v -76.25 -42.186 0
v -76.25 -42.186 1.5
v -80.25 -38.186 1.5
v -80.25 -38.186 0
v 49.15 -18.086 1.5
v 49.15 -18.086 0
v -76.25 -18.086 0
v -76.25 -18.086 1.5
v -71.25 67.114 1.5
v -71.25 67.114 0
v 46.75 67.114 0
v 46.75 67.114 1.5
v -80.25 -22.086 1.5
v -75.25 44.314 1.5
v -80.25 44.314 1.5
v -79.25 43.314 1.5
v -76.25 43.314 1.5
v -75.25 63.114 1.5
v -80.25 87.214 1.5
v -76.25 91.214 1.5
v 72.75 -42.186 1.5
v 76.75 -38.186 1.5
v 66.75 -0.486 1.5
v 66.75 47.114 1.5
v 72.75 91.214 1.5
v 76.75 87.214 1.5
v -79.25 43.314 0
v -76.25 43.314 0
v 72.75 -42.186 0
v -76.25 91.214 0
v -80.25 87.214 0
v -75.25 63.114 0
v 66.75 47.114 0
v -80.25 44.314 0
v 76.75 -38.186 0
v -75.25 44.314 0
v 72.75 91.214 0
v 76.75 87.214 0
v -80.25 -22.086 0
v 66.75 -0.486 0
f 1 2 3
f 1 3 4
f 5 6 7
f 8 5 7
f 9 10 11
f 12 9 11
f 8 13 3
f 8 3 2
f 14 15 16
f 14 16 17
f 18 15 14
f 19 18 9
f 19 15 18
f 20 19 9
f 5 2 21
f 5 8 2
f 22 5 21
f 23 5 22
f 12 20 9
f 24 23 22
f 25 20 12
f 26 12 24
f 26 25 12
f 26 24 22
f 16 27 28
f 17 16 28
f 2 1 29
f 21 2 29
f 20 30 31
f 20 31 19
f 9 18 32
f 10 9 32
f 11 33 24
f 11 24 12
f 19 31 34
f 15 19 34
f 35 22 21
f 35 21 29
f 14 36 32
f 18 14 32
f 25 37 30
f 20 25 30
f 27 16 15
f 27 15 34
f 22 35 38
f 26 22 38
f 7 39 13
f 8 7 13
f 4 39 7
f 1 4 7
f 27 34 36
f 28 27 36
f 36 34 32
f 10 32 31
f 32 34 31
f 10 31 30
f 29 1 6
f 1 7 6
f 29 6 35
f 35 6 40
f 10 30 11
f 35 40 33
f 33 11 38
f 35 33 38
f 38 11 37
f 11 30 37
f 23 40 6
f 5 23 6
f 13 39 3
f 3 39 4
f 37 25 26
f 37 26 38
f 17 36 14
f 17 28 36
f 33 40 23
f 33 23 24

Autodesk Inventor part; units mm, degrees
ref_plane "YZ Plane" through (0, 0, 0) normal (1, 0, 0) x (0, 1, 0)
ref_plane "XZ Plane" through (0, 0, 0) normal (0, 1, 0) x (-1, 0, 0)
ref_plane "XY Plane" through (0, 0, 0) normal (0, 0, 1) x (1, 0, 0)
sketch "Эскиз1" plane through (0, 0, 0) normal (0, 0, 1) x (1, 0, 0)
  line L0 (0, 0) -> (-80.25, 0) construction
  line L1 (-80.25, 0) -> (-80.25, -18.086) construction
  line L2 (-80.25, -18.086) -> (0, -18.086) construction
  line L3 (0, -18.086) -> (0, 0) construction
  line L4 (-80.25, -18.086) -> (-80.25, -42.186) construction
  line L5 (-80.25, -18.086) -> (-56.15, -18.086) construction
  line L6 (-80.25, -42.186) -> (76.75, -42.186)
  line L7 (76.75, -42.186) -> (76.75, 91.214)
  line L8 (76.75, 91.214) -> (-80.25, 91.214)
  line L9 (-80.25, 91.214) -> (-80.25, -42.186)
  line L10 (-80.25, -42.186) -> (76.75, -42.186)
  line L11 (76.75, -42.186) -> (76.75, -18.086)
  line L12 (76.75, -18.086) -> (-80.25, -18.086)
  line L13 (-80.25, -18.086) -> (-80.25, -42.186)
  line L14 (76.75, 91.214) -> (-80.25, 91.214)
  line L15 (-80.25, 91.214) -> (-80.25, 67.114)
  line L16 (-80.25, 67.114) -> (76.75, 67.114)
  line L17 (76.75, 67.114) -> (76.75, 91.214)
  line L18 (-80.25, -42.186) -> (-75.25, -42.186)
  line L19 (-75.25, -42.186) -> (-75.25, 88.814)
  line L20 (-75.25, 88.814) -> (-80.25, 88.814)
  line L21 (-80.25, 88.814) -> (-80.25, -42.186)
  line L22 (76.75, -42.186) -> (66.75, -42.186)
  line L23 (66.75, -42.186) -> (66.75, 88.814)
  line L24 (66.75, 88.814) -> (76.75, 88.814)
  line L25 (76.75, 88.814) -> (76.75, -42.186)
  line L26 (76.75, -42.186) -> (41.75, -42.186)
  line L27 (41.75, -42.186) -> (41.75, -22.186)
  line L28 (41.75, -42.186) -> (61.75, -42.186) construction
  line L29 (76.75, 23.314) -> (-80.25, 23.314)
  line L30 (41.75, 88.814) -> (41.75, 68.814)
  line L31 (66.75, 67.114) -> (66.75, 47.114)
  line L32 (66.75, 47.114) -> (46.75, 67.114)
  line L33 (66.75, 47.114) -> (95.0343, 47.114) construction
  line L34 (66.75, -0.486) -> (46.75, -20.486)
  line L35 (-75.25, 23.314) -> (-80.25, 23.314)
  line L36 (-80.25, 23.314) -> (-80.25, 43.314)
  line L37 (-80.25, 43.314) -> (-75.25, 43.314)
  line L38 (-75.25, 43.314) -> (-75.25, 23.314)
  point P0 (-75.25, -18.086)
  point P1 (-75.25, 67.114)
  point P2 (71.75, 70.413)
  point P3 (66.75, -18.086)
  point P4 (66.75, -0.486)
  point P5 (49.15, -18.086)
  point P6 (-80.25, 43.314)
  point P7 (-75.25, 43.314)
  point P8 (-80.25, -18.086)
  dimension "d0" = 80.25
  dimension "d1" = 18.086
  dimension "d2" = 24.1
  dimension "d3" = 90
  dimension "d4" = 157
  dimension "d5" = 133.4
  dimension "d6" = 157
  dimension "d7" = 24.1
  dimension "d8" = 157
  dimension "d9" = 24.1
  dimension "d10" = 5
  dimension "d11" = 131
  dimension "d12" = 10
  dimension "d13" = 131
  dimension "d16" = 35
  dimension "d17" = 20
  dimension "d18" = 90
  dimension "d19" = 20
  dimension "d20" = 135
  dimension "d21" = 20
extrude "Выдавливание1" add sketch "Эскиз1" along normal blind 1.5 contours L9 L12 L19 L6 | L19 L12 L23 L6 | L23 L12 L7 L6 | L34 L23 L12 | L9 L16 L19 L37 | L23 L29 L7 L12 | L23 L16 L7 L29 | L9 L20 L19 L16 | L19 L20 L9 L8 L7 L24 L23 L16 | L32 L16 L23 | L23 L24 L7 L16
sketch "Эскиз2" plane through (-80.25, -42.186, 0) normal (0, -1, 0) x (1, 0, 0)
  line L0 (129.4, 0) -> (0, 0) projected
  line L1 (157, 0) -> (0, 0) projected
  line L2 (0, 0) -> (157, 0)
  line L3 (157, 0) -> (78.5, 0)
  line L4 (78.5, 0) -> (78.5, -20)
  line L5 (78.5, -20) -> (73.5, -20)
  line L6 (73.5, -20) -> (49.6649, 0)
  line L7 (78.5, -20) -> (83.5, -20)
  line L8 (83.5, -20) -> (107.3351, 0)
  point P0 (80.25, 0)
  dimension "d22" = 20
  dimension "d24" = 5
  dimension "d25" = 140
chamfer "Фаска1" distance 4 angle 45 6 edges at (76.75, 91.214, 0.75) (76.75, -42.186, 0.75) (-80.25, -18.086, 0.75) (-80.25, -42.186, 0.75) (-80.25, 91.214, 0.75) (-75.25, 67.114, 0.75)
chamfer "Фаска2" distance 1 angle 45 2 edges at (-80.25, 43.314, 0.75) (-75.25, 43.314, 0.75)
properties part number "sensor board"
